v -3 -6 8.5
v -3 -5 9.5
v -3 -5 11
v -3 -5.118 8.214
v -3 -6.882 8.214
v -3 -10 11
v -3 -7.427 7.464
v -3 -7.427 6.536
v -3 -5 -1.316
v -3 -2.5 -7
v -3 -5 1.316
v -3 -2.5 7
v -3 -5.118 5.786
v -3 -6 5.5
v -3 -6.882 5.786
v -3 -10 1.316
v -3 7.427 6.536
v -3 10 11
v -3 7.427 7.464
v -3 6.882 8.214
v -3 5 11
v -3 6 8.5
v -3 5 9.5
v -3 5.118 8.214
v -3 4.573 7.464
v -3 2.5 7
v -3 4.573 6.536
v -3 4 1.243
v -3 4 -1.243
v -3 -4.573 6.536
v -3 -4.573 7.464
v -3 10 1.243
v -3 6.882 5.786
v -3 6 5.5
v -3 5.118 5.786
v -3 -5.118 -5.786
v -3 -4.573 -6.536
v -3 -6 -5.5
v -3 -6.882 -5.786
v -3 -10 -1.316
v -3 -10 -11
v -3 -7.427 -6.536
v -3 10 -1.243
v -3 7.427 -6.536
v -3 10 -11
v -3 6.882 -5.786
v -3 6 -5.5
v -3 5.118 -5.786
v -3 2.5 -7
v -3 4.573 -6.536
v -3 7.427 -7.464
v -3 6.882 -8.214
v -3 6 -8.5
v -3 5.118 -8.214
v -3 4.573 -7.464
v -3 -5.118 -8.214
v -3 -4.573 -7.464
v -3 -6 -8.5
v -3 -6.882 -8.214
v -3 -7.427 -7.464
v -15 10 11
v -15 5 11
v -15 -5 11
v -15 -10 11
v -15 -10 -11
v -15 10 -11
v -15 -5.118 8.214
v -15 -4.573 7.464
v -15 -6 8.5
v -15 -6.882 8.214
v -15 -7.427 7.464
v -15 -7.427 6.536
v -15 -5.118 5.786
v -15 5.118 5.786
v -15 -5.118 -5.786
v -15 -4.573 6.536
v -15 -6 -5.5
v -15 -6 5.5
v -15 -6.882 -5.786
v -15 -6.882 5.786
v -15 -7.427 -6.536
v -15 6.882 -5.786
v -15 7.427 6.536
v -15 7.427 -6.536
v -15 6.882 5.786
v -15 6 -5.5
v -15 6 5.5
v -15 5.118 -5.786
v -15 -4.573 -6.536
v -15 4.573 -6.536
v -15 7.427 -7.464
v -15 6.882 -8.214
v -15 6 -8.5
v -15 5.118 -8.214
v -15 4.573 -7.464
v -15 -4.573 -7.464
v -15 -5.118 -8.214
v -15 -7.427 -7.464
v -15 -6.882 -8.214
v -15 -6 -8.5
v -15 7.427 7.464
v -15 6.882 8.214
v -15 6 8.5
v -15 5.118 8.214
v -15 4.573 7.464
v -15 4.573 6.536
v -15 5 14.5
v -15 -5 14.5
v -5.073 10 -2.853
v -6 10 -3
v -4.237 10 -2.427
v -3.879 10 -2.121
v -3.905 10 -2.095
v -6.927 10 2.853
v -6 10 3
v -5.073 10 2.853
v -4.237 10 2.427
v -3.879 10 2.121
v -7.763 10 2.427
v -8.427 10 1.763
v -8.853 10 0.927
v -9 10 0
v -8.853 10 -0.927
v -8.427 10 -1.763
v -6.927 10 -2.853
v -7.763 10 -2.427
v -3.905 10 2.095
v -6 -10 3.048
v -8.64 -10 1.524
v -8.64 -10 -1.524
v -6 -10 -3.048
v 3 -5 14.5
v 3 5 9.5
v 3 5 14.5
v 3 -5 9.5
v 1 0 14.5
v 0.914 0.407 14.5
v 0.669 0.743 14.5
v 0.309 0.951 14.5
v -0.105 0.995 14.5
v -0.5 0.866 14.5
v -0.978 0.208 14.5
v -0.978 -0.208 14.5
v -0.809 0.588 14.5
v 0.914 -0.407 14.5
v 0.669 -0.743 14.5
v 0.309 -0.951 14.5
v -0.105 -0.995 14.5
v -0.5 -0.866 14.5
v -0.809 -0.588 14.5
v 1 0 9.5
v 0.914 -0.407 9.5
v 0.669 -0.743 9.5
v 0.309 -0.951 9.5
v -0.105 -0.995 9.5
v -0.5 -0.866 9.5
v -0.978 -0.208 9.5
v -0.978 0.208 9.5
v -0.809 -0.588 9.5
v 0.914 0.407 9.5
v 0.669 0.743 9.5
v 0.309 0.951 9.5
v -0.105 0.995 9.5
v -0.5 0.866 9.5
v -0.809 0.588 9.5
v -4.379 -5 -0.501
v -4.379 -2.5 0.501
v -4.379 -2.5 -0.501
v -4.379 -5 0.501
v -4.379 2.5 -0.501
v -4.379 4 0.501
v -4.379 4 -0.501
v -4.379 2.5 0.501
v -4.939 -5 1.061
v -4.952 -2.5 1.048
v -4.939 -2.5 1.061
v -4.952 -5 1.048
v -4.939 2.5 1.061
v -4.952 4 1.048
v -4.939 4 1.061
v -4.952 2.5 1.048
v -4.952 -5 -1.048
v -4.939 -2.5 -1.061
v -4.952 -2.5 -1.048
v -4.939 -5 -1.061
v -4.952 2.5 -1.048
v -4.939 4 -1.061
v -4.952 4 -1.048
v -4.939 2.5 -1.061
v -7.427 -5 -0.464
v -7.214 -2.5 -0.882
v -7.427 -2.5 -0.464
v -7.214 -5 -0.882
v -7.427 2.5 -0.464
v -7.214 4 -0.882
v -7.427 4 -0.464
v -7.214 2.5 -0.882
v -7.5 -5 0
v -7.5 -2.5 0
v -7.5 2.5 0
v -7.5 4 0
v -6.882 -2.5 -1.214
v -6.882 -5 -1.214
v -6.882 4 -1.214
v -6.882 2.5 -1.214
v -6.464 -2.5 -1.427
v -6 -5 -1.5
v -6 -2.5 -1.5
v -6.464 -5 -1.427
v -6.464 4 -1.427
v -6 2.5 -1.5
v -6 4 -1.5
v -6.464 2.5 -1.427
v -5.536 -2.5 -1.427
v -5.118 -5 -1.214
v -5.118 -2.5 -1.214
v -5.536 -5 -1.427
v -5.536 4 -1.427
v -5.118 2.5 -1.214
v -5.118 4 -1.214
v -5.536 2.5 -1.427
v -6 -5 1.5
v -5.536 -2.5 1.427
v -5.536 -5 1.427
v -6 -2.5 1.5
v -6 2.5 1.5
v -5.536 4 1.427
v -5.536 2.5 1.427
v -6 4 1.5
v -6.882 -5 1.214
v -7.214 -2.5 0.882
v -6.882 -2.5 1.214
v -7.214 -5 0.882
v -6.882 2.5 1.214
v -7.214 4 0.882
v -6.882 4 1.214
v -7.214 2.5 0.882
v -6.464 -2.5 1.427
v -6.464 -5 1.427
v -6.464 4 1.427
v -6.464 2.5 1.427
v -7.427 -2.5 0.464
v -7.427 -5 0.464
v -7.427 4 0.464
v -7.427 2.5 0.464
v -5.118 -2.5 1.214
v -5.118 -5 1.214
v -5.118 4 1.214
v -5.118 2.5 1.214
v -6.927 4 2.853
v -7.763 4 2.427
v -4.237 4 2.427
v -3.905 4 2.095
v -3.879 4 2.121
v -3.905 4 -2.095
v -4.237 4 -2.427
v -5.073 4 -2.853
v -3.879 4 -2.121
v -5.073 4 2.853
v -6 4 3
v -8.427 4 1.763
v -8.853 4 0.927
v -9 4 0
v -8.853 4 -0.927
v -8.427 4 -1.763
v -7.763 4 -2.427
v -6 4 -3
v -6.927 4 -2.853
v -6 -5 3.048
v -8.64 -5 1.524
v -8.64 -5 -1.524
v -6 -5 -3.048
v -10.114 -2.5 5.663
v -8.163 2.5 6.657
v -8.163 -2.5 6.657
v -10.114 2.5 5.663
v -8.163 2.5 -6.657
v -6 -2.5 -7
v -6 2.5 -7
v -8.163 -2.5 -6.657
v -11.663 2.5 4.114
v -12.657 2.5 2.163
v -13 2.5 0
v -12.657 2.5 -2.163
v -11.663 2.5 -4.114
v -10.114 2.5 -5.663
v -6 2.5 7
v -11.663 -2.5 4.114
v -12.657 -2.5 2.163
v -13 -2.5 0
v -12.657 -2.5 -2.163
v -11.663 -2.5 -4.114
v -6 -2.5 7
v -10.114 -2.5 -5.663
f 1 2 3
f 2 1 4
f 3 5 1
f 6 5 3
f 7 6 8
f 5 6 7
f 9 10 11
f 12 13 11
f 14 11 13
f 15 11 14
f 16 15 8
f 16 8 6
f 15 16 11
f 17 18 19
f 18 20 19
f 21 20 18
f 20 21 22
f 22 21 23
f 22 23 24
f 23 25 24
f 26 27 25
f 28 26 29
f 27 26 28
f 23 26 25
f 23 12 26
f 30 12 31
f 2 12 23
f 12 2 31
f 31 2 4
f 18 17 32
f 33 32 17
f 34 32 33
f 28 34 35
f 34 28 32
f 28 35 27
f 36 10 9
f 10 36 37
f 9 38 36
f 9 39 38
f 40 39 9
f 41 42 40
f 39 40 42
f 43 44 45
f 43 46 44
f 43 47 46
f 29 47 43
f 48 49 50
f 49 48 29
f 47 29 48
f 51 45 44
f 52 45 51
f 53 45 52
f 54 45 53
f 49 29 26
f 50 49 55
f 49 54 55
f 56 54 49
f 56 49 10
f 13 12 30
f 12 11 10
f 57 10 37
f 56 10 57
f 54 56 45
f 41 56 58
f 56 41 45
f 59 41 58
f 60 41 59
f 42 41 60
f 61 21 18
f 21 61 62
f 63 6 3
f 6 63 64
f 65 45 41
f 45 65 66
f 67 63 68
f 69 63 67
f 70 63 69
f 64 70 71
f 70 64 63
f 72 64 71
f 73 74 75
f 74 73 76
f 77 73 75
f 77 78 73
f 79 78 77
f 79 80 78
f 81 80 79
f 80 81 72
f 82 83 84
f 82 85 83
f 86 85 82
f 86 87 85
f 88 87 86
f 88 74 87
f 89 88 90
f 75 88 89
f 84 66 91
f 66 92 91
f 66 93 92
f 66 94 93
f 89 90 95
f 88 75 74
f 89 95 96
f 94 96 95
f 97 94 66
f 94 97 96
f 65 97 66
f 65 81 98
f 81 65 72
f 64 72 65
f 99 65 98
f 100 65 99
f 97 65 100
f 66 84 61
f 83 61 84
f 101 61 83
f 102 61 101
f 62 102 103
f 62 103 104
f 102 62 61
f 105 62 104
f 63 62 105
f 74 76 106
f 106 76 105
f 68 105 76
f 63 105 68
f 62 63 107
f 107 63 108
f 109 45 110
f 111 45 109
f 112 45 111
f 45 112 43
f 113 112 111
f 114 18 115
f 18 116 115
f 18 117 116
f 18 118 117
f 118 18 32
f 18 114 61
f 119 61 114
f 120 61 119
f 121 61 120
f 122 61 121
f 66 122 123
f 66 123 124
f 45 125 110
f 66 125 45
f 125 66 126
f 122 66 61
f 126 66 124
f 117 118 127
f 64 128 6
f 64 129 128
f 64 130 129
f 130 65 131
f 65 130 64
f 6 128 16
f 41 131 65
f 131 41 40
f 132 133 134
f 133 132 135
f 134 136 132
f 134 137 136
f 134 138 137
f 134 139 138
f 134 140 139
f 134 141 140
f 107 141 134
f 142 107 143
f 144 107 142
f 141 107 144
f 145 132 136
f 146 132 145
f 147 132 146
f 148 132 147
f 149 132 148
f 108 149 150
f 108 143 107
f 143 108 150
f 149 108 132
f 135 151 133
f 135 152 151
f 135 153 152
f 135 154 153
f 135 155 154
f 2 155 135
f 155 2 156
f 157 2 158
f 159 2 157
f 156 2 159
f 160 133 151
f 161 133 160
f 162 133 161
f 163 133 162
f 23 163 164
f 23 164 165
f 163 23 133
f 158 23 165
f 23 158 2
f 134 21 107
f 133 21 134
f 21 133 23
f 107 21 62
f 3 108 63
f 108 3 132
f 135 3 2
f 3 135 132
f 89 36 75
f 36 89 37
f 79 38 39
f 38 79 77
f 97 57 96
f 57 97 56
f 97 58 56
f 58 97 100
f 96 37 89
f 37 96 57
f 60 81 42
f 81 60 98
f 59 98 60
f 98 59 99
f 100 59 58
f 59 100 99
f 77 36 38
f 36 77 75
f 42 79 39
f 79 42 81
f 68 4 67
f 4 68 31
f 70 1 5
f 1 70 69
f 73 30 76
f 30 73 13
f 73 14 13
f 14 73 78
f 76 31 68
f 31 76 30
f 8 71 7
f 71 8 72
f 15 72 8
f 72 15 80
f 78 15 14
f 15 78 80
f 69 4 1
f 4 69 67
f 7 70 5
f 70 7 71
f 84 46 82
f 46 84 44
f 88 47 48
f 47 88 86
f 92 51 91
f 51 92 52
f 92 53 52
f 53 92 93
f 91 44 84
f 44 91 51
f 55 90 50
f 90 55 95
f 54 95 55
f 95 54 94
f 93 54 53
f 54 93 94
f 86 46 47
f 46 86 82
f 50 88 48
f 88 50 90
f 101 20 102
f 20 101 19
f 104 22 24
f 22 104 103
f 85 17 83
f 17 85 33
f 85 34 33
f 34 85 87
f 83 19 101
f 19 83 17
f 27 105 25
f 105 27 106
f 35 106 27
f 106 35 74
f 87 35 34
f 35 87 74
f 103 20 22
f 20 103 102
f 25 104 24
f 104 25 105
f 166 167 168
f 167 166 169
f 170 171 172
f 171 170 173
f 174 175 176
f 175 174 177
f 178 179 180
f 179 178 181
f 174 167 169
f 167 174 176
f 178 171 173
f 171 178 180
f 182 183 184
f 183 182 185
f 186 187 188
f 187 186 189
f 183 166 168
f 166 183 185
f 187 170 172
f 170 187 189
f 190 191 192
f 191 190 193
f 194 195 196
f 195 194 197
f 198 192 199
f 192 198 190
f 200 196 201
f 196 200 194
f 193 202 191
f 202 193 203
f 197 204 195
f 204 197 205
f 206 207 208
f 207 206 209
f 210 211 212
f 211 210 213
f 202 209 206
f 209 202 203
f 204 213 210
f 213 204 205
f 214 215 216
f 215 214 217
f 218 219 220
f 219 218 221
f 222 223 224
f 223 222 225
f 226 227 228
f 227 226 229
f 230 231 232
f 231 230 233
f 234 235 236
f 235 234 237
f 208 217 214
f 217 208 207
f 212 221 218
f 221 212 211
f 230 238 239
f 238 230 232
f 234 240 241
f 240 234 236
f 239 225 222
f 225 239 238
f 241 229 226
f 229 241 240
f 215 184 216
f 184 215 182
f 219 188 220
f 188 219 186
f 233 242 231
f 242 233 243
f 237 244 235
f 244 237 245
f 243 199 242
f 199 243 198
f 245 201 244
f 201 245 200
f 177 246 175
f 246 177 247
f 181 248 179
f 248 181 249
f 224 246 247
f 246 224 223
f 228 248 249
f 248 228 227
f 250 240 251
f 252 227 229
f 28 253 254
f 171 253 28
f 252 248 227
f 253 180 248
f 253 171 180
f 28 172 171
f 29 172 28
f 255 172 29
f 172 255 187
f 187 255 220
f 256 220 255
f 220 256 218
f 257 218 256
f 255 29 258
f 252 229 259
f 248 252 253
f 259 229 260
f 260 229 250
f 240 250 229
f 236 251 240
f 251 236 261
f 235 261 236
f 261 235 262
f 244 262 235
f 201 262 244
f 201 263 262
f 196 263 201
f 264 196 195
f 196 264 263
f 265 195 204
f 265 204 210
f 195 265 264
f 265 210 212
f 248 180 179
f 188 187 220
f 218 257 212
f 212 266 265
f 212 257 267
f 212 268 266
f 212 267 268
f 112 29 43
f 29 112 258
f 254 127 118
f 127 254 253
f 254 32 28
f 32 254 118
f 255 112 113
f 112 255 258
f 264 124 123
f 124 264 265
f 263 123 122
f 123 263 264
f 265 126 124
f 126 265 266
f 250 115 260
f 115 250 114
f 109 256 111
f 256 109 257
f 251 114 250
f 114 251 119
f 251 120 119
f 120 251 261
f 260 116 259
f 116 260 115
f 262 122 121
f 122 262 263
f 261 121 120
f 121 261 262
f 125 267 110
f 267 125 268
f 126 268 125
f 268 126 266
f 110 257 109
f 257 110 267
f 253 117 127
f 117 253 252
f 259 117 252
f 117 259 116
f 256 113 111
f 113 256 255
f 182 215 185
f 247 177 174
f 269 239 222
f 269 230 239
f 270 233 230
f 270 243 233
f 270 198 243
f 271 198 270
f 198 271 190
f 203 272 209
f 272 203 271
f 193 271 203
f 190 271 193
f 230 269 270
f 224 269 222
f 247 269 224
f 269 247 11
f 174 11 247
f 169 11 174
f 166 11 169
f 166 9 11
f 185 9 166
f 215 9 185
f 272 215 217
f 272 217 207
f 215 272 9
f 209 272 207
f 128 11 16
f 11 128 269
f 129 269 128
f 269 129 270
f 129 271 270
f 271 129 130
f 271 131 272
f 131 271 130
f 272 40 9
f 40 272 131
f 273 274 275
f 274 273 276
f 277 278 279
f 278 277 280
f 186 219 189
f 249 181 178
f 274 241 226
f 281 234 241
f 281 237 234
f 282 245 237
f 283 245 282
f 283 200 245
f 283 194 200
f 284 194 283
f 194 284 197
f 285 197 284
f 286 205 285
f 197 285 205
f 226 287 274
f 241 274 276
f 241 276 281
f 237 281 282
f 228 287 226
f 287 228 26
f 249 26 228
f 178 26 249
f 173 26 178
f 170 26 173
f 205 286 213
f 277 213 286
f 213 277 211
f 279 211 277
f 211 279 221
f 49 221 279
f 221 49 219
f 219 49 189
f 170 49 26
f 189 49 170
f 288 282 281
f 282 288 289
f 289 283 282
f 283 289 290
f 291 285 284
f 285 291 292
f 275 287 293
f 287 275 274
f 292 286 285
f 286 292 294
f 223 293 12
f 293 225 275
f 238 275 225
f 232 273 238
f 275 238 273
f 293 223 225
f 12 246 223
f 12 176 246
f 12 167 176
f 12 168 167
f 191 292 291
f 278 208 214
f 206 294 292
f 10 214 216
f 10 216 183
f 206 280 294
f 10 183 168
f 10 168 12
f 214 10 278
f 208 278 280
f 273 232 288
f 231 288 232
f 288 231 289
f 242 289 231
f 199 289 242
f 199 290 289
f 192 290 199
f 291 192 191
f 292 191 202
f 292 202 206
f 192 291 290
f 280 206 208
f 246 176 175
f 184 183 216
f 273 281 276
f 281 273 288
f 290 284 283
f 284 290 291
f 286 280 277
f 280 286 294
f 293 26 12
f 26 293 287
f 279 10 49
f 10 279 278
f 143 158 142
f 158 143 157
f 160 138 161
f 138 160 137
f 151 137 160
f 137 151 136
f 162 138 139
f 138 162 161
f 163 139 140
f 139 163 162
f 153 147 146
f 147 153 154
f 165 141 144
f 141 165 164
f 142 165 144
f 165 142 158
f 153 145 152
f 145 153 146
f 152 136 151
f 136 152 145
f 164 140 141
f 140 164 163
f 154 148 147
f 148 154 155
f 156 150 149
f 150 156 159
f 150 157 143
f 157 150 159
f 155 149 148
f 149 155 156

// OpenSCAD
// file: parameters.scad
// Parameters file for RepRap Huxley (and maybe Mendel)

huxley=true;
mendel=!huxley;

pi=3.14159265;

// The relative location in your file system where the .dxf files are
// DXFs are for quick development.  They should be replaced by parameterised CSG in dure course.

fileroot="DXF-files/";

rodsize = 6;	//threaded/smooth rod diameter in mm
xaxis = 182.5;	//width of base in mm
yaxis = 266.5;	//length of base in mm


screwsize = 3;	//bearing bore/screw diameter in mm
bearingsize = 10;	//outer diameter of bearings in mm
bearingwidth = 4;	//width of bearings in mm


rodpitch = rodsize / 6;
rodnutsize = 0.8 * rodsize;
rodnutdiameter = 1.9 * rodsize;
rodwashersize = 0.2 * rodsize;
rodwasherdiameter = 2 * rodsize;
screwpitch = screwsize / 6;
nutsize = 0.8 * screwsize;
nutdiameter = 1.9 * screwsize;
washersize = 0.2 * screwsize;
washerdiameter = 2 * screwsize;
partthick = 2 * rodsize;
vertexrodspace = 2 * rodsize;


c = [0.3, 0.3, 0.3];
rodendoffset = rodnutsize + rodwashersize * 2 + partthick / 2;
vertexoffset = vertexrodspace + rodendoffset;


renderrodthreads = false;
renderscrewthreads = false;
fn = 36;

// The gap between the joining rods at a vertex

vertex_radius=sqrt(rodsize*rodsize + vertexoffset*vertexoffset);
vertex_ang = atan(vertexoffset/rodsize)-30;
vertex_gap = 2*vertex_radius*cos(vertex_ang);

// Nema 14 dimensions - these are absolute

nema14_square=35.3;
nema14_screws=26;
nema14_screw_r=1.5;
nema14_hub=22;
nema14_hub_depth=2;
nema14_length=36;
nema14_shaft=5;
nema14_shaft_length=66;
nema14_shaft_projection=19;

// Nema 11 dimensions - these are absolute

nema11_square=28.5;
nema11_screws=23;
nema11_screw_r=1.25;
nema11_hub=22;
nema11_hub_depth=2;
nema11_length=44.5;
nema11_shaft=5;
nema11_shaft_length=78;
nema11_shaft_projection=18;

// Limit switch parameters

limit_switch_hole_diameter=2.5;
limit_switch_centres=9.5;

// The RepRap slide bearings

bearing_mount_centres=18;
bearing_width=7;
bearing_depth=18;

// X axis parameters - many should be relative

x_bar_gap=30;
motor_center_y = 26;
bar_clamp_x=5;
bar_clamp_y=8;
bar_clamp_x_gap=23;
bearing_y=50;
bearing_x=bar_clamp_x_gap + 10;
hole_land=4;
thickness=5;
bearing_low_z = 8;
bearing_z_gap = 25;
bearing_plate_width = bearing_mount_centres+2*hole_land + 10;
bearing_plate_overlap=0.5;
bearing_plate_support=10;
// main file
include <parameters.scad>;
use <library.scad>;

motor_angle=-21.5;
gear_mesh=7;
clamp_centres=19;
plate_thickness=5;
filament_y_offset=-20;

module accessories(holes=false, angle=270)
{
	translate([0,0,-bearing_depth/2])
	{
	for(i=[-1,1])
	{

		// X axis rods

		if(!holes)
		translate([0, i*x_bar_gap/2 , 0])
			rotate([0,90,0])
				rod(100);
		// Belts

		if(!holes)
		translate([0, i*40 , 0])
			cube([100,2,6], center=true);

		//360 bearings

		translate([i*20, -x_bar_gap/2, 0])
			rotate([90,0,-90])
				if(holes)
					adjustable_bearing(true, angle);
				else
					adjustable_bearing(true,-1);

	}

	// 180 bearing

	translate([20, x_bar_gap/2, 0])
		rotate([90, 0,90])
			if(holes)
				adjustable_bearing(false, angle);
			else
				adjustable_bearing(false,-1);
	}

	if(holes)
	{
		// Filament
	
		cylinder(h=150,r=1,center=true, $fn=15);
	
		// Nozzle
	
		translate([0, 0, -23+plate_thickness])
		cylinder(h=46,r=4,center=true, $fn=15);
		translate([-clamp_centres/2, 0, 0])
		cylinder(h=40,r=screwsize/2,center=true, $fn=15);
		translate([clamp_centres/2, 0, 0])
		cylinder(h=40,r=screwsize/2,center=true, $fn=15);
	}

}

module idler_holes(screws=true, bearing=true)
{
	translate([1,0,0])
	union()
	{
		if(screws)
		{
			for(i=[-1,1])
			for(j=[-1,1])
			translate([0,i*6,j*7])
				rotate([0,90,0])
				{
					cylinder(h=60,r=screwsize/2,center=true, $fn=10);
					translate([0,0,30])
						cylinder(h=20,r=nutsize,center=true, $fn=6);
				}
		}

		if(bearing)
		{
			rotate([90,0,0])
			{
				translate([0,0,-15])
					rotate([0,0,180])
					{
						teardrop(h=30,r=screwsize/2,truncateMM=0.5);
						translate([0,0,-19])
						{
							teardrop(h=30,r=screwsize,truncateMM=0.5);
							translate([0,0,61])
								pentanut(height=20);
						}
					}
				cylinder(h=5,r=7,center=true, $fn=20);
				translate([5,0,0])
					cube([10,14,5],center=true);
			}
		}



	}
}


module idler(body=true)
{
	translate([-7,0,0])
	if(body)
	{
		difference()
		{
			union()
			{
				translate([-2,0,0])
					cube([12,20,22], center = true);
				translate([1,0,12])
					cube([18,10,5], center = true);
			}
			idler_holes();
			translate([7,0,0])
				cylinder(h=100,r=1,center=true, $fn=15);
		}
	} else
		idler_holes(screws=true, bearing=false, filament=true);
}

module drive_gear_and_motor(gear=true, holes=false)
{
	if(gear)
		rotate([90,gear_mesh,0])
			grub_gear(hub_height = 7, hub_radius = 9.5, shaft_radius = 2.5, height = 8, number_of_teeth = 11, 
				inner_radius = 6.5, outer_radius = 9, angle=25);
	
	translate([0, 12,0])
		rotate([-90,0,0])
	 		nema11(body=!holes, slots = -1, counterbore=8);
}

module driven_gear(wingnut=false)
{
	translate([0,-7,0])
	rotate([-90,0,0])
	difference()
	{
		union()
		{
			grub_gear(hub_height = 10, hub_radius = 10, shaft_radius = 3, height = 7, 
				number_of_teeth = 31, inner_radius = 22, outer_radius = 25, angle=15);
			if(wingnut)
				difference()
				{
					strut(p1=[0,-7,-5], p2=[0,7,-5], wide = 10, deep = 15, round=2);
					cylinder(h=50,r=9, center=true,$fn=20);
				}
		}
		if(wingnut)
		{
			intersection()
			{
				translate([0,16,-14])
					rotate([-30,0,0])
						cube([4, 26, 20], center=true);
				cylinder(h=50,r=13, center=true,$fn=20);
			}
			intersection()
			{
				translate([0,-16,-14])
					rotate([30,0,0])
						cube([4, 26, 20], center=true);
				cylinder(h=50,r=13, center=true,$fn=20);
			}
		}
	}
}

module m6_shaft(body=true, bearing_gap=28)
{
	translate([0,-17,0])
	rotate([-90,0,0])
	{
		union()
		{
			translate([0,0,(bearing_gap+27)/2])
				if(body)
					rod(bearing_gap+27);
				else
					cylinder(h=bearing_gap+52,r=7.5,center=true);

			translate([0,0,bearing_gap+22])
				if(body)
					cylinder(h=6,r=9.5,center=true);
				else
					cylinder(h=6.2,r=10,center=true);

			translate([0,0,22])
				if(body)
					cylinder(h=6,r=9.5,center=true);
				else
					cylinder(h=6.2,r=10,center=true);
		}	
	}
}

module drive_assembly()
{
	m6_shaft(body=true, bearing_gap=28);
	driven_gear(wingnut=true);
	translate([-32*cos(motor_angle), 1, 32*sin(motor_angle)])
		drive_gear_and_motor();
	translate([-5-4, -filament_y_offset, 0])
		rotate([90,0,0])
			cylinder(h=4, r=5, center=true, $fn=20);

}

module base_plate()
{
	difference()
	{
		translate([0, 0, plate_thickness/2])
			cube([50,60,plate_thickness], center=true);
		accessories(holes=true, angle=361);
	}
}

idler();

/*translate([3,filament_y_offset,31])
	drive_assembly();

base_plate();

accessories();*/
